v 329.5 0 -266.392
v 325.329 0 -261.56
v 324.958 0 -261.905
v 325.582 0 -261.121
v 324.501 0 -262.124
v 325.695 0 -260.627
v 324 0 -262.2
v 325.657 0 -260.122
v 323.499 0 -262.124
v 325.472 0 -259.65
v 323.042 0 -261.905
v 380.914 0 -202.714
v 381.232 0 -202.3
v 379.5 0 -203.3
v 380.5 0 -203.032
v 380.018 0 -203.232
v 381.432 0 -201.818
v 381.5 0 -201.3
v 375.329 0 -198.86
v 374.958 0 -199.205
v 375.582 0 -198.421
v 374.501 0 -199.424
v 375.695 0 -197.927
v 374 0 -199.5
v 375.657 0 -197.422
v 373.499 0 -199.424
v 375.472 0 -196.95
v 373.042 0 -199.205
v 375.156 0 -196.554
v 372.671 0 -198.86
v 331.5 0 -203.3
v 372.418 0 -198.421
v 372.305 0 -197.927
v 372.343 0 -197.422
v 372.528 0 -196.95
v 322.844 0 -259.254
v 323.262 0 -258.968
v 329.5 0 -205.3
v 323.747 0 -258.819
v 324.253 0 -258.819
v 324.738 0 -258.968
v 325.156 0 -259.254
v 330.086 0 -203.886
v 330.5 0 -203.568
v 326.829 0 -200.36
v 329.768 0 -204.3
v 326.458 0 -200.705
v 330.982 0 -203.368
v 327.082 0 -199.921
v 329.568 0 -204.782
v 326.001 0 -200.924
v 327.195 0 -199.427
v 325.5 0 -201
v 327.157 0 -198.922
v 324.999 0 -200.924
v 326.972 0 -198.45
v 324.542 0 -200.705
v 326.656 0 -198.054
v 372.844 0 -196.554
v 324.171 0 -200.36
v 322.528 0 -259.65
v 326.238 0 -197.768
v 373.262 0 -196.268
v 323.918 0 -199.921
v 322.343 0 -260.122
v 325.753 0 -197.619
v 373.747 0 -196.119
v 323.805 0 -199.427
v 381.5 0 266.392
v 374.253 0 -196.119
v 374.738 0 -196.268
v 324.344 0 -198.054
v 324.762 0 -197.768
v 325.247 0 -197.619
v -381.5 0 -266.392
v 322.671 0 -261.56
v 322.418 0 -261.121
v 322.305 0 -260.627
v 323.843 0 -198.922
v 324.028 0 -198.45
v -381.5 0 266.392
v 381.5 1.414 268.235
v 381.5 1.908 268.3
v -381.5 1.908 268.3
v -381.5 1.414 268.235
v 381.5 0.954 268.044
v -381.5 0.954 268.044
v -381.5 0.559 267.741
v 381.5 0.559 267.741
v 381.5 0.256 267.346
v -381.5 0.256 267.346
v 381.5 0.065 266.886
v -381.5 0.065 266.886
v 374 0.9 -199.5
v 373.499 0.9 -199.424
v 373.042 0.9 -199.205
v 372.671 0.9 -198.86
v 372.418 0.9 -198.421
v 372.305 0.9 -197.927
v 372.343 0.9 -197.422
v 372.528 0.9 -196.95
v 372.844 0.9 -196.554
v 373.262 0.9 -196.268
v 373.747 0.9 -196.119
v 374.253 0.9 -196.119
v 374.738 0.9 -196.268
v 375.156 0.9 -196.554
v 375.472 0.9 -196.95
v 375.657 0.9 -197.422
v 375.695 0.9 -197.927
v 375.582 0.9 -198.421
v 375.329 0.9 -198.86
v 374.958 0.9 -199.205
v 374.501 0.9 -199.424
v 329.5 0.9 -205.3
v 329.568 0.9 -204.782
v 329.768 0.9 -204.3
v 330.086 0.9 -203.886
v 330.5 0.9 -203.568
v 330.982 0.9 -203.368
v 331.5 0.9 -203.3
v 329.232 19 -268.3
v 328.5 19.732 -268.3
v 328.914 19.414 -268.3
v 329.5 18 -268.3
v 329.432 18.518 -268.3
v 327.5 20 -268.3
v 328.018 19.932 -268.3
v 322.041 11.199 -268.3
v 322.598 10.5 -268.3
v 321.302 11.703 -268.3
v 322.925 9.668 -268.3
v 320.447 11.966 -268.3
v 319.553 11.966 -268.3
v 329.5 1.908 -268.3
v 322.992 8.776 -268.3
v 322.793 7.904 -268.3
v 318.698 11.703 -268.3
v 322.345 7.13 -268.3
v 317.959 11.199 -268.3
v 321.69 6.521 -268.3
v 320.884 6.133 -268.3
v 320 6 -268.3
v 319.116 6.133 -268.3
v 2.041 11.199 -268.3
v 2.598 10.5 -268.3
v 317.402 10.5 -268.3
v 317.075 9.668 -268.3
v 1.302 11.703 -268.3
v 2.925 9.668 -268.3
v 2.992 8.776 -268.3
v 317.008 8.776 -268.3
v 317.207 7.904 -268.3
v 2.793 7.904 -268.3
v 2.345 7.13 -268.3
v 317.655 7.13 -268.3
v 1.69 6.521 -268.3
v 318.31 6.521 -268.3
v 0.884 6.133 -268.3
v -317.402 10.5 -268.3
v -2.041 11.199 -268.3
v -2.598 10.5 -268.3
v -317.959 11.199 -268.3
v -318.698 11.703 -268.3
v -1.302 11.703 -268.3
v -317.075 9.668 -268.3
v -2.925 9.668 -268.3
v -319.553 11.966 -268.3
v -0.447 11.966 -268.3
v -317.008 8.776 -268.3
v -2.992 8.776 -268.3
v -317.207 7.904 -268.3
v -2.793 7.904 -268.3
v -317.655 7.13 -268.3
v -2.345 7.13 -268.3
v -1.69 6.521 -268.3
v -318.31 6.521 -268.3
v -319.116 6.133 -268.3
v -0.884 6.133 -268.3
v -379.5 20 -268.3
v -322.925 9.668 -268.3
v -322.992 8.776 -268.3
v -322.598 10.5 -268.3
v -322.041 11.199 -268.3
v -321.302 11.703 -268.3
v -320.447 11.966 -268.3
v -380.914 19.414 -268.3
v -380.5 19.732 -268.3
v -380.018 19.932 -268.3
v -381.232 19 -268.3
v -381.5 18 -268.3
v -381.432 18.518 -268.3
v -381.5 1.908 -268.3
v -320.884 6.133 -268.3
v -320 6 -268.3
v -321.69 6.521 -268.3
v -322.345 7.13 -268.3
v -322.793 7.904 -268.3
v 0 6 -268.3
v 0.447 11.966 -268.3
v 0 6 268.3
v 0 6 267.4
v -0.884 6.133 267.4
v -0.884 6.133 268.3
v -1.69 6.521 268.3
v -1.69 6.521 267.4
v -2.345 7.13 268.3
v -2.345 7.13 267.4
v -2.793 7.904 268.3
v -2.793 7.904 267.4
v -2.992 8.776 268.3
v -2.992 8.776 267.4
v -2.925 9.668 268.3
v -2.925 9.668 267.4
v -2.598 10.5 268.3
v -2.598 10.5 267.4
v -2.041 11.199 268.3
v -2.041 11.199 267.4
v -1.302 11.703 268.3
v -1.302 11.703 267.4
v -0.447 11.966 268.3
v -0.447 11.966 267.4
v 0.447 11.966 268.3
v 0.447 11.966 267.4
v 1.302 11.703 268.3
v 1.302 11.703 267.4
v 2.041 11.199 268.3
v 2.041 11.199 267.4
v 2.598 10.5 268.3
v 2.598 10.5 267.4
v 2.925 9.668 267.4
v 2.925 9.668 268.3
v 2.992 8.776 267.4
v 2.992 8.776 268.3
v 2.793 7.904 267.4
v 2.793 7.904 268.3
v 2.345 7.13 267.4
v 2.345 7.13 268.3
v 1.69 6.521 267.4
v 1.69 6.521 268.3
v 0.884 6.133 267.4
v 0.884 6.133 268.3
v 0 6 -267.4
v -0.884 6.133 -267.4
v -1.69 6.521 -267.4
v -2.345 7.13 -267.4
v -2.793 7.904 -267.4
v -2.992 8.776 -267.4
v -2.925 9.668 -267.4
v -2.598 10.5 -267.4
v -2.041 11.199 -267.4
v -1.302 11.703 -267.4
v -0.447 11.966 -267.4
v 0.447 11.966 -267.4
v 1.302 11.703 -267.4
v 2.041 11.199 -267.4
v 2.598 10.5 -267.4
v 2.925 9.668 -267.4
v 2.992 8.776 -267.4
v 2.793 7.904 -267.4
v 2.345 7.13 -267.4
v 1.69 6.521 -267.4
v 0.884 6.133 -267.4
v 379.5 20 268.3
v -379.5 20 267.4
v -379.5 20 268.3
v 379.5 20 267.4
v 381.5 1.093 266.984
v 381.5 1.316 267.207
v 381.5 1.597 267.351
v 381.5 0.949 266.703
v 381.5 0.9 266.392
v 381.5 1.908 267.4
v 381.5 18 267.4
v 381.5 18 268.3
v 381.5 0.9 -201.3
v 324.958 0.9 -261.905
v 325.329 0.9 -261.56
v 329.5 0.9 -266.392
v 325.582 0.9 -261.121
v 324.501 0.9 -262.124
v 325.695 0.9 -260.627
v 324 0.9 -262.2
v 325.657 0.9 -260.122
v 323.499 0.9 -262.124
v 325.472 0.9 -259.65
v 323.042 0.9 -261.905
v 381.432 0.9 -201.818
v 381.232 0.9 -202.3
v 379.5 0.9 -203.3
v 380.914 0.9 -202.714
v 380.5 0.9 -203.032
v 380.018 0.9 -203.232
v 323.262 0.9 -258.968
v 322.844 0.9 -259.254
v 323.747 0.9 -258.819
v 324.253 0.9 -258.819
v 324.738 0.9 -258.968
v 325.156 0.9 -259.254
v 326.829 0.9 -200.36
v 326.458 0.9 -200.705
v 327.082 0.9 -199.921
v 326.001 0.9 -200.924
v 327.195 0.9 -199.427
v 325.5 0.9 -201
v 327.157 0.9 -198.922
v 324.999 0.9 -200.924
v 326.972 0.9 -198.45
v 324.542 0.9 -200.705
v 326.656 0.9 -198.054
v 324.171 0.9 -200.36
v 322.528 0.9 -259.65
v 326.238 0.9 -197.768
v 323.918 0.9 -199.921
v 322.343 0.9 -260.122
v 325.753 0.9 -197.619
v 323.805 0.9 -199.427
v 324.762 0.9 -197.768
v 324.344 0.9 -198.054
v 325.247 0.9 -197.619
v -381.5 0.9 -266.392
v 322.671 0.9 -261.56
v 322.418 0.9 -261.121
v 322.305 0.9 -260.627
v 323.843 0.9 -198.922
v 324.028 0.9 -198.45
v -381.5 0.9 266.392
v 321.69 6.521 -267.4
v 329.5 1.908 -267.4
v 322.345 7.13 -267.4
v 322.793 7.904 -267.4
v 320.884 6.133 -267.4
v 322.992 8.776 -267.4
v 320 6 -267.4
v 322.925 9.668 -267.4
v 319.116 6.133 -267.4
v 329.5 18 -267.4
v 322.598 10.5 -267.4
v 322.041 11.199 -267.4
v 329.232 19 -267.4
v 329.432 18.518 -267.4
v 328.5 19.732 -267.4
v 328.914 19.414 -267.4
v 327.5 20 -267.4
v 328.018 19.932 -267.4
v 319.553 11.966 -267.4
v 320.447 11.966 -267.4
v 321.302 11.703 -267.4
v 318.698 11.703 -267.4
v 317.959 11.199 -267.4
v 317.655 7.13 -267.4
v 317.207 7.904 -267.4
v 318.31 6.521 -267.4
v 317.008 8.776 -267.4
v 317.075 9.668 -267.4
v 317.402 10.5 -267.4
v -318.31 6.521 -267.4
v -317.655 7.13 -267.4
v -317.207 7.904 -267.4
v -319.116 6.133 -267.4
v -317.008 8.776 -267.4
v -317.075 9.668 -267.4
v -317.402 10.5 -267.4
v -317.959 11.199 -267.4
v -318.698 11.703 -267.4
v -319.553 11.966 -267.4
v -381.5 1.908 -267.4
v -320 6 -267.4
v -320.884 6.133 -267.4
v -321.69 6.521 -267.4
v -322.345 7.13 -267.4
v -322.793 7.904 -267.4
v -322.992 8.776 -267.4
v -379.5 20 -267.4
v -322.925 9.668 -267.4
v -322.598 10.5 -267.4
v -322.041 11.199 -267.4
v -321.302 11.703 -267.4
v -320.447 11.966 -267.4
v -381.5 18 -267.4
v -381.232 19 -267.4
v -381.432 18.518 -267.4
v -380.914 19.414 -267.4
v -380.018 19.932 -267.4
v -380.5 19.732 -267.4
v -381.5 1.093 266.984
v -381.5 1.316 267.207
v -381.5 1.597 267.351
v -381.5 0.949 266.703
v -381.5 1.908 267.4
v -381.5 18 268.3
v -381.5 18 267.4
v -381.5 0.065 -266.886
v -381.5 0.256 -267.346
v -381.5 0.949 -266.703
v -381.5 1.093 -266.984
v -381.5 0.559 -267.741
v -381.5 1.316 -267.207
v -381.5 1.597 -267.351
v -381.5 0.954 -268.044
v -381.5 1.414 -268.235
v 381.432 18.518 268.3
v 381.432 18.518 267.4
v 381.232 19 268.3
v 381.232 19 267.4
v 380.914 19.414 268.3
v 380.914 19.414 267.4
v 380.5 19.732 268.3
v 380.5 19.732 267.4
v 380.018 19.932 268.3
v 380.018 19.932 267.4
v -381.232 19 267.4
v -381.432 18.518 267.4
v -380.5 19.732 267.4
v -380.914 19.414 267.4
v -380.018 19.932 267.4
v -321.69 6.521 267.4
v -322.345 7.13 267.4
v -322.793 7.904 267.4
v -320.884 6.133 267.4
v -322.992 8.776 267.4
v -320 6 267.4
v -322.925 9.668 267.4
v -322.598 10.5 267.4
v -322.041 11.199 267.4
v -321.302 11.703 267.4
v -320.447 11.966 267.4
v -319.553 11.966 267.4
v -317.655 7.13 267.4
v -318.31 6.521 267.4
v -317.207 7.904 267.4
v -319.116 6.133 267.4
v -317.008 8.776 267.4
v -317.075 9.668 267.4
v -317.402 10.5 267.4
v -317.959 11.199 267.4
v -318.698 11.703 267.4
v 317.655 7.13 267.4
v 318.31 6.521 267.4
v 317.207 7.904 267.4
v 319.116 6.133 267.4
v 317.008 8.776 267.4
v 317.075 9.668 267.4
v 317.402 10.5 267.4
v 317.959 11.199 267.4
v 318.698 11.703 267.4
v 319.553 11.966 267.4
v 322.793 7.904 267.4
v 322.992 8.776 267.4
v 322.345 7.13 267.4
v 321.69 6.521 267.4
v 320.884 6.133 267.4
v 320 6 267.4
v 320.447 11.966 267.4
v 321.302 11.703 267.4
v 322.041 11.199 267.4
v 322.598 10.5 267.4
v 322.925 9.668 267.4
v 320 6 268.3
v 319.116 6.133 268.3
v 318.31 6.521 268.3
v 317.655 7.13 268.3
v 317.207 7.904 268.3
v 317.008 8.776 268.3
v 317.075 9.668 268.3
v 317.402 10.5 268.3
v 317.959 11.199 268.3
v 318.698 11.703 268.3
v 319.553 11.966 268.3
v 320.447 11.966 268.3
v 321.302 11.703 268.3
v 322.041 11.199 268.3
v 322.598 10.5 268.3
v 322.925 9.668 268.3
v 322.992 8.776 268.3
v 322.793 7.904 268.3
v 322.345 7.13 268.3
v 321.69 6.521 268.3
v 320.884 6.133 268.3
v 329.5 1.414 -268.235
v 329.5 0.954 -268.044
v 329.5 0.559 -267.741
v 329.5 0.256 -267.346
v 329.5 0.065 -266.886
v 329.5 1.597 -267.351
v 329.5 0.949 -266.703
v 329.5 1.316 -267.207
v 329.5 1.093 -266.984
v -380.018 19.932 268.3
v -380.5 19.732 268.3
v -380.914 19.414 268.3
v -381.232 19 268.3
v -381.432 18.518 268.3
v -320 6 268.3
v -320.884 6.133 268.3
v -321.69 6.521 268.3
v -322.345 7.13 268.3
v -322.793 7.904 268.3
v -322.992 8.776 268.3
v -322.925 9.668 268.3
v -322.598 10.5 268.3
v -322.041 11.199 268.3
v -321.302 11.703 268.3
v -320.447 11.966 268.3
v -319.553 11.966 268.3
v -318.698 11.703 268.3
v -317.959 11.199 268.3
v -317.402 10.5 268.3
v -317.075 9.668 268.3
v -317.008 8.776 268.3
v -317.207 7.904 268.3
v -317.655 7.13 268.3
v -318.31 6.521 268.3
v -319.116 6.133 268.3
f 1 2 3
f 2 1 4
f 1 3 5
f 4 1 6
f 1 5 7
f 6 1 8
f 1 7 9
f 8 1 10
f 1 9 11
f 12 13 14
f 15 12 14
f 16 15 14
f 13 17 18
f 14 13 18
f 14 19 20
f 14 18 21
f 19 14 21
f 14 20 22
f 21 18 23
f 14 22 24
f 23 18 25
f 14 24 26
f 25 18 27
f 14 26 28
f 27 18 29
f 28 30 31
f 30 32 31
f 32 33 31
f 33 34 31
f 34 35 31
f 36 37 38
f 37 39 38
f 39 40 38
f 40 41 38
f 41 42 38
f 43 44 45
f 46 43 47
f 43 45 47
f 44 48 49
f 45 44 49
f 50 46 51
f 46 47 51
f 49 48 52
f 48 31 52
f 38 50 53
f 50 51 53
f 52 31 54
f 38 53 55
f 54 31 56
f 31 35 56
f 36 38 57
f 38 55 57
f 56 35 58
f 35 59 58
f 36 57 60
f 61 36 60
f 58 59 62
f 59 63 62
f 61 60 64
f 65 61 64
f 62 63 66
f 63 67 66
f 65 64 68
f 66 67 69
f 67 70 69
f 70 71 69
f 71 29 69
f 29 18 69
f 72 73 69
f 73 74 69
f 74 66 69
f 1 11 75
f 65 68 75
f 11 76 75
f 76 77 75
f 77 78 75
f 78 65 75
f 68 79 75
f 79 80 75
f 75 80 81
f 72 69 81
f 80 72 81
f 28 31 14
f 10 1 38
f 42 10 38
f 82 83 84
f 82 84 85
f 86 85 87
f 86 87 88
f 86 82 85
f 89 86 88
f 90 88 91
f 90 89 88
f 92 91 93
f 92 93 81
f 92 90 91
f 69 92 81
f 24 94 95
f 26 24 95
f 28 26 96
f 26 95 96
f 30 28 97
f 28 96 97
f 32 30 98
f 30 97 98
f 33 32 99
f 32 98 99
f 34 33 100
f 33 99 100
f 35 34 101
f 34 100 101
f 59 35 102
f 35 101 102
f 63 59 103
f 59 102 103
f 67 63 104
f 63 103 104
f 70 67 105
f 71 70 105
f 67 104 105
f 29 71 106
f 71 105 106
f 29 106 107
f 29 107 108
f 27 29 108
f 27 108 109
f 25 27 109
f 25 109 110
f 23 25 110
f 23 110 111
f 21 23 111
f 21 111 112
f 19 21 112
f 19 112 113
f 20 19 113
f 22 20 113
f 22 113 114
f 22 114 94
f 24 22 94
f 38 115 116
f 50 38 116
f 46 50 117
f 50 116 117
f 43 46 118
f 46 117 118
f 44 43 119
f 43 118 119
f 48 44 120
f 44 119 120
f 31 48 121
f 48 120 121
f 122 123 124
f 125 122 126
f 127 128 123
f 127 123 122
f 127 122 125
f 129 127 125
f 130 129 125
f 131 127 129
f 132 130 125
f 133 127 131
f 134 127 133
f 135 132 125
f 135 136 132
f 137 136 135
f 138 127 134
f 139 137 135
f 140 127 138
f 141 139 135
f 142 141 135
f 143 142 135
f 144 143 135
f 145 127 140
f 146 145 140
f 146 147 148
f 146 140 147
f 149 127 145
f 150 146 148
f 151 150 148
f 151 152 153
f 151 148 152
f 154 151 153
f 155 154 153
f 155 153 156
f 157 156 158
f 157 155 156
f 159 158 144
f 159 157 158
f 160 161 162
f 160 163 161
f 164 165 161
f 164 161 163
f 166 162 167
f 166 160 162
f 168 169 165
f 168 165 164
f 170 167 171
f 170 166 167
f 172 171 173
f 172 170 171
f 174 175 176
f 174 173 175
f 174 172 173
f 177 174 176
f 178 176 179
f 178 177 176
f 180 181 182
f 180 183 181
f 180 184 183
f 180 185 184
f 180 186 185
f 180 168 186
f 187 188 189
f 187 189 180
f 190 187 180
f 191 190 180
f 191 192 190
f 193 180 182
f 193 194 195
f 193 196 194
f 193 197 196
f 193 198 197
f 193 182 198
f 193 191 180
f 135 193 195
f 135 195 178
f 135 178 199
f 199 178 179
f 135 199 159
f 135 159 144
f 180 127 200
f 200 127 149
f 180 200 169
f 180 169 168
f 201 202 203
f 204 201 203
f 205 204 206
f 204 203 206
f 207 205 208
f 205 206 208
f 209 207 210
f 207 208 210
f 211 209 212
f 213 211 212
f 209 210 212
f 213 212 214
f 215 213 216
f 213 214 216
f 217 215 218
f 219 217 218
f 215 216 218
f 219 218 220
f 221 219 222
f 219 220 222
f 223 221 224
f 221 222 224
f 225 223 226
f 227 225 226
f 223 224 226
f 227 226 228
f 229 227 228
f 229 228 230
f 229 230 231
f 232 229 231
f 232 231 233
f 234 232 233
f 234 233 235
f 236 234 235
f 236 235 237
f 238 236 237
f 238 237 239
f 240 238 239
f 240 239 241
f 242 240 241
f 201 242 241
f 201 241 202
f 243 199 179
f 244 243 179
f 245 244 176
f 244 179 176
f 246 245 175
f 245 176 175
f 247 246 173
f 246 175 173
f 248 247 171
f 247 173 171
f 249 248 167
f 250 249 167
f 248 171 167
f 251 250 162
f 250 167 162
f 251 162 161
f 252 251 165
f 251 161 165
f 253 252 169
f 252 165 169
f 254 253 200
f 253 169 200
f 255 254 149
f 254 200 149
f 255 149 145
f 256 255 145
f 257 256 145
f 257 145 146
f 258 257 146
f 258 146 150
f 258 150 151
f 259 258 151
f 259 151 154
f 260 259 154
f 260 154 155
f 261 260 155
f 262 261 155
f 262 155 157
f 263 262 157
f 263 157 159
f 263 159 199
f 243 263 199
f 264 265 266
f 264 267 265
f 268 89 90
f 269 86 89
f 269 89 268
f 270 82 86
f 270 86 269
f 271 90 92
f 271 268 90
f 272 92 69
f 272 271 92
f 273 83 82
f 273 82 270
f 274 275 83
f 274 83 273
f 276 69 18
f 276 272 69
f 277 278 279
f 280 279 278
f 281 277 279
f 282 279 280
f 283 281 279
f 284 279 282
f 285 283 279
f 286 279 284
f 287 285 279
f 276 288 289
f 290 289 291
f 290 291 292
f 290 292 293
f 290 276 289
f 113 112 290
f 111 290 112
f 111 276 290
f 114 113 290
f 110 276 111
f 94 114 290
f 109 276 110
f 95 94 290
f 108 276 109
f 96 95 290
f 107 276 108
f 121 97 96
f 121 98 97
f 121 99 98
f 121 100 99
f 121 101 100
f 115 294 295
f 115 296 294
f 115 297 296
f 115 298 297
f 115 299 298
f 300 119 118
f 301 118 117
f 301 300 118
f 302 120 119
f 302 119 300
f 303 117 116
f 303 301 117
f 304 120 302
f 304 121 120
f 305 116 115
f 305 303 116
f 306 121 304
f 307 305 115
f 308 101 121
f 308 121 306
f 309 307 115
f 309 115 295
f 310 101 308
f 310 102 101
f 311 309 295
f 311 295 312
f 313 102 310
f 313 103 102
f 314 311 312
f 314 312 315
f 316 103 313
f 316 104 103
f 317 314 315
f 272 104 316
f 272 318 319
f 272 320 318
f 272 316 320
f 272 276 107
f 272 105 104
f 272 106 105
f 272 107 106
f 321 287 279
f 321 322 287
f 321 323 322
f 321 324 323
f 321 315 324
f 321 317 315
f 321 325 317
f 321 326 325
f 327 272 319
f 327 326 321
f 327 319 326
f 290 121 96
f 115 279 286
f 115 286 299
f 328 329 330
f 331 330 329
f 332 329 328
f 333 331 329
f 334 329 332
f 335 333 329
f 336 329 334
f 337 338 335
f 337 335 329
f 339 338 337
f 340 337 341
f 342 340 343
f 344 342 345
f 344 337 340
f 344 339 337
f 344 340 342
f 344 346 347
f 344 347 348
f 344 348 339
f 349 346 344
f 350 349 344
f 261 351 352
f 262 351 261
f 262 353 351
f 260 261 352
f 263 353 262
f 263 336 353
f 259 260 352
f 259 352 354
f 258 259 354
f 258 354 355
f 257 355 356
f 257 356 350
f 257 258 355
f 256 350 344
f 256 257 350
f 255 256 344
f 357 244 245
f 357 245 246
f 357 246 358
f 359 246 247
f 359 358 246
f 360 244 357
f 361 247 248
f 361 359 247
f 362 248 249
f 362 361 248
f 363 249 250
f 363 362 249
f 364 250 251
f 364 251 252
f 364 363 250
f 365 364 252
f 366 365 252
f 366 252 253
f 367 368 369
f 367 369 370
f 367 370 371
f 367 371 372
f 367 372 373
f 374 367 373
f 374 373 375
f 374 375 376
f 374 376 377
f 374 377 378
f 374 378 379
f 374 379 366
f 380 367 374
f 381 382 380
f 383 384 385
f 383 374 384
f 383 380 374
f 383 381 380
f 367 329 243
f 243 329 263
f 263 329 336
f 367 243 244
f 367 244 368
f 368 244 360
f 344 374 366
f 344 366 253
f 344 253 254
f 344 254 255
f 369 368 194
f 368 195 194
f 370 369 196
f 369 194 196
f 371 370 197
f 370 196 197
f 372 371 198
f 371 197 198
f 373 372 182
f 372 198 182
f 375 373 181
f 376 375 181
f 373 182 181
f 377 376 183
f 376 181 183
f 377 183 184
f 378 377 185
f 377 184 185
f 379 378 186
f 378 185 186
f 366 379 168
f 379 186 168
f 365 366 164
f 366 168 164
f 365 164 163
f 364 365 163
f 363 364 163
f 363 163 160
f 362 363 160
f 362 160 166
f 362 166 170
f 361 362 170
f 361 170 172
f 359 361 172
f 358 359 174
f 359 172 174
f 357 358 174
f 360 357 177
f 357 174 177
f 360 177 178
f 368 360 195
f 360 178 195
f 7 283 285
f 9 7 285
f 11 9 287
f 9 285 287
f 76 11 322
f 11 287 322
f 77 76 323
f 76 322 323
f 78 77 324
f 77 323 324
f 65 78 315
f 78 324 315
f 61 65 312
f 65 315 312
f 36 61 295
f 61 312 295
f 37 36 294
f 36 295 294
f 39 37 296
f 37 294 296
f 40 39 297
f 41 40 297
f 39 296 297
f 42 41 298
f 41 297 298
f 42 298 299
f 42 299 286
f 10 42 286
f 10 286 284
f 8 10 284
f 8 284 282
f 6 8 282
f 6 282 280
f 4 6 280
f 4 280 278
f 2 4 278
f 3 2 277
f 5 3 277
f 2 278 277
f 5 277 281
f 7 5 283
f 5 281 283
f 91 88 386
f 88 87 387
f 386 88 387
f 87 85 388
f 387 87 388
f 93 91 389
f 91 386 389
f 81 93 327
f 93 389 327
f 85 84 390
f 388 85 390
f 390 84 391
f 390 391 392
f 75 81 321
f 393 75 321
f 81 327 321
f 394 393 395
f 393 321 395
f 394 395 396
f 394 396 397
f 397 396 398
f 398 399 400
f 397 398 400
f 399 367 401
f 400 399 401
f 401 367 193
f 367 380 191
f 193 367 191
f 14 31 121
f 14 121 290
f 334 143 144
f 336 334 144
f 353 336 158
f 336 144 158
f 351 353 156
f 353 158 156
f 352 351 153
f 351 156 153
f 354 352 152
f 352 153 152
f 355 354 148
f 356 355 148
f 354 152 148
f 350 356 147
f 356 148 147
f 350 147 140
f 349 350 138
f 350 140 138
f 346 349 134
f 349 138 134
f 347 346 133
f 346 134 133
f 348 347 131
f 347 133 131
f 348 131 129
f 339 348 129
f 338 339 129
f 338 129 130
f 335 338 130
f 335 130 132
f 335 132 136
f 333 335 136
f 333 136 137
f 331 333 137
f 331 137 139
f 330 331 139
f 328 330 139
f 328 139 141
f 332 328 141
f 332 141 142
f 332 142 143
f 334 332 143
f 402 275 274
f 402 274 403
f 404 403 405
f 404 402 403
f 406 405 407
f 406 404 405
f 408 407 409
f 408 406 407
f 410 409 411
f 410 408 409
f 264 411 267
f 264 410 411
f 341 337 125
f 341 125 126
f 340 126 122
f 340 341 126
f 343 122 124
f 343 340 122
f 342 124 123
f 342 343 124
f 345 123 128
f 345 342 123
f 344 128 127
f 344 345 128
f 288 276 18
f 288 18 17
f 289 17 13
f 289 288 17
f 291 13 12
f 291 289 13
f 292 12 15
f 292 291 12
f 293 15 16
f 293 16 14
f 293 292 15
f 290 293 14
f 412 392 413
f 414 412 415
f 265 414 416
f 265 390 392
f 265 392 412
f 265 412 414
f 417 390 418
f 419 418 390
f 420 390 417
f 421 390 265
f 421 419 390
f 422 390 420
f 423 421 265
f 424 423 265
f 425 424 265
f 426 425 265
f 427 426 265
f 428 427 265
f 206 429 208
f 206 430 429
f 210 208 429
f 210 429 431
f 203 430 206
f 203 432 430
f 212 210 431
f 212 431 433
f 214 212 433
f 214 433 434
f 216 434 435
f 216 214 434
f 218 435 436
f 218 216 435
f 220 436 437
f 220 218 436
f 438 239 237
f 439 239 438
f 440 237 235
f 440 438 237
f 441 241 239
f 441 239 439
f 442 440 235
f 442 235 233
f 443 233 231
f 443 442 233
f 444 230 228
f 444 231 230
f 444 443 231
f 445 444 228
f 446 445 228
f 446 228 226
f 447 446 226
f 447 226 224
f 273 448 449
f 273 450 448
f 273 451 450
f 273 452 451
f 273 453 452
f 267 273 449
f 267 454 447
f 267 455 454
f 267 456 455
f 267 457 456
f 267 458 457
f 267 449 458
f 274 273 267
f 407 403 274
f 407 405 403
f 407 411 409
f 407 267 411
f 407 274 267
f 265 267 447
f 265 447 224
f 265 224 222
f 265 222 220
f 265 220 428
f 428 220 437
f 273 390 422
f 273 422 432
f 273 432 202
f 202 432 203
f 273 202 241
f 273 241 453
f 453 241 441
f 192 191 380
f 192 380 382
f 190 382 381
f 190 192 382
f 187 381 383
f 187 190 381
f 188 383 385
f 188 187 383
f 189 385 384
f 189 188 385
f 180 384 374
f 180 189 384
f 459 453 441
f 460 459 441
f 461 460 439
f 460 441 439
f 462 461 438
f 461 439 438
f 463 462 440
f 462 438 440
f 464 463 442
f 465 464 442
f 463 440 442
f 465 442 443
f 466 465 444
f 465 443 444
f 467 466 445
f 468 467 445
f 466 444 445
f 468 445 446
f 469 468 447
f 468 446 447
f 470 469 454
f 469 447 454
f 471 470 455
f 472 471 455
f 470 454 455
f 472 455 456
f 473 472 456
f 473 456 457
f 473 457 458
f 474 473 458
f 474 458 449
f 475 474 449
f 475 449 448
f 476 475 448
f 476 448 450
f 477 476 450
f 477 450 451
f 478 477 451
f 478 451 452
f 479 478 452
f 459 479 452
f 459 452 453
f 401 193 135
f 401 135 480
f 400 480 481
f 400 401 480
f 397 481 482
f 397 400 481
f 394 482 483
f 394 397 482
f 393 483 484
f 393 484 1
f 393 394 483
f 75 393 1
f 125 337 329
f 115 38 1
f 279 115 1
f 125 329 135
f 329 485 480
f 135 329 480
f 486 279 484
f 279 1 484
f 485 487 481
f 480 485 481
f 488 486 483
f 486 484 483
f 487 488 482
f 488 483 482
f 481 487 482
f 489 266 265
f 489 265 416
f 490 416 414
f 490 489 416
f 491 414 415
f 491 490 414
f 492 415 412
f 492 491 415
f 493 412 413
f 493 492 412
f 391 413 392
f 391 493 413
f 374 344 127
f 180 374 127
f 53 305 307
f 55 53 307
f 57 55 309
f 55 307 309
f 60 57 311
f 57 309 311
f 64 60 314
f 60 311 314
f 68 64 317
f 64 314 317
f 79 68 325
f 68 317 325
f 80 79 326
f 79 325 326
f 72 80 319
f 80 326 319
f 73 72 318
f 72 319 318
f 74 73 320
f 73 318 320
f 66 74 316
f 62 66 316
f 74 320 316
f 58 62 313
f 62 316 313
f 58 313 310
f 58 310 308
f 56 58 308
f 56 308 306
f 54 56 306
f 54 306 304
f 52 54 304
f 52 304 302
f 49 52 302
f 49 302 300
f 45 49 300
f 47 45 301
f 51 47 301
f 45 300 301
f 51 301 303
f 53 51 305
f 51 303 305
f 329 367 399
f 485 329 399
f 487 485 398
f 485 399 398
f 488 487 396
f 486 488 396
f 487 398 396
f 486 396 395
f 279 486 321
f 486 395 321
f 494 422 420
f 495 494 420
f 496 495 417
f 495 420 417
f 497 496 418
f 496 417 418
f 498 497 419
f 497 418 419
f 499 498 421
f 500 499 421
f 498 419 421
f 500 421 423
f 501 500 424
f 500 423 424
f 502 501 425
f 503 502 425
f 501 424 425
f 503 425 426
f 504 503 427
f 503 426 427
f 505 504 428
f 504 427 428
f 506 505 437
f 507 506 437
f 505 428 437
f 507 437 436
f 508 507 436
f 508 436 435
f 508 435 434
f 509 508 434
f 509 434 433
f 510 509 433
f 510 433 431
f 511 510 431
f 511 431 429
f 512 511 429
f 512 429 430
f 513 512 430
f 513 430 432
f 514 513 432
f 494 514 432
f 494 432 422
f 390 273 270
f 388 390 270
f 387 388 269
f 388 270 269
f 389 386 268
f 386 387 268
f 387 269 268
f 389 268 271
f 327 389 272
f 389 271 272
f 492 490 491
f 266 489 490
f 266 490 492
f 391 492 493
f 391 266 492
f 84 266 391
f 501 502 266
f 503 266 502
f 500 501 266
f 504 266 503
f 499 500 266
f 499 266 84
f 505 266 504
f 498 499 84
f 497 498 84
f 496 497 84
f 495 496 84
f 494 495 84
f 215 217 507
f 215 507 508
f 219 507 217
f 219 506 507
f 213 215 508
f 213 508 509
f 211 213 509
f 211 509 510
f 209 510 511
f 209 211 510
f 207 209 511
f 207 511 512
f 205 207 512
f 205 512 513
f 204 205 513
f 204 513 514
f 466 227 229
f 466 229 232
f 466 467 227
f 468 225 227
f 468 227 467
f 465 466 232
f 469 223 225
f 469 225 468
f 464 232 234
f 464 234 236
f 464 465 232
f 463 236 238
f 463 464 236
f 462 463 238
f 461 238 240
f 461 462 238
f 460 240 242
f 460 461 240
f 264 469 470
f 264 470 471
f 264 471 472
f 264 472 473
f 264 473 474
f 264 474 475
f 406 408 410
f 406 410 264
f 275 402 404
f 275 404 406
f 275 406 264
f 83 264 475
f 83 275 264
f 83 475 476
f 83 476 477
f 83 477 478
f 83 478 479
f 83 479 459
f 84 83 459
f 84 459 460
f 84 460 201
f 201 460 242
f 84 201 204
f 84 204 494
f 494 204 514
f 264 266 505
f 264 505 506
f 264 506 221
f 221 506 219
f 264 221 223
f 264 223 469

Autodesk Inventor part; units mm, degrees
ref_plane "YZ Plane" through (0, 0, 0) normal (1, 0, 0) x (0, 1, 0)
ref_plane "XZ Plane" through (0, 0, 0) normal (0, 1, 0) x (-1, 0, 0)
ref_plane "XY Plane" through (0, 0, 0) normal (0, 0, 1) x (1, 0, 0)
sketch "Sketch1" plane through (0, 0, 0) normal (0, 1, 0) x (-1, 0, 0)
  line L0 (381.5, 268.3) -> (-381.5, 268.3)
  line L1 (-381.5, 268.3) -> (-381.5, -268.3)
  line L2 (-381.5, -268.3) -> (381.5, -268.3)
  line L3 (381.5, -268.3) -> (381.5, 268.3)
  line L4 (381.5, 268.3) -> (-381.5, -268.3) construction
  line L5 (-381.5, 268.3) -> (381.5, -268.3) construction
  point P0 (0, 0)
  dimension "d0" = 763
  dimension "d1" = 536.6
extrude "Plate1" add sketch "Sketch1" along normal blind 0.9
sketch "Sketch2" plane through (381.5, 0, 267.4) normal (0, 0, 1) x (1, 0, 0)
  line L0 (-763, 0) -> (0, 0)
  line L1 (0, 0) -> (0, 20)
  line L2 (0, 20) -> (-763, 20)
  line L3 (-763, 20) -> (-763, 0)
edge flange "Flange1" height 20 angle 90 thickness 0.9 bend radius 1.008 thickness toward (0, 0, 1) relief tear relief width 0.9 relief depth 0.45 corner gap 1.008 corner form 0 edges at (0, 0.9, 268.3) (0, 0.9, -268.3) wall of the first edge with corners at (-381.5, 0, 267.4) (381.5, 0, 267.4) (381.5, 20, 267.4) (-381.5, 20, 267.4)
bend "Bend1"
corner "Corner1"
sketch "Sketch3" plane through (-381.5, 20, 268.3) normal (0, 0, 1) x (1, 0, 0)
  circle A0 centre (381.5, -11) radius 1.7
  circle A1 centre (61.5, -11) radius 1.7
  line L0 (0, 0) -> (763, 0) projected
  point P0 (381.5, -20)
  point P1 (701.5, -11)
  dimension "d20" = 11
  dimension "d41" = 320
  dimension "d42" = 320
hole "Hole1" at (-320, 9, 268.3) at (0, 9, 268.3) at (320, 9, 268.3) direction (0, 0, -1) diameter 6 end through all
sketch "Sketch6" plane through (0, 0, 0) normal (0, -1, 0) x (1, 0, 0)
  line L0 (381.5, -268.3) -> (-381.5, -268.3) projected
  line L1 (329.5, -203.3) -> (329.5, -268.3)
  line L2 (329.5, -268.3) -> (381.5, -268.3)
  line L3 (381.5, -268.3) -> (381.5, -203.3)
  line L4 (329.5, -203.3) -> (381.5, -203.3)
  point P0 (0, 0)
  dimension "d39" = 52
  dimension "d44" = 65
extrude "Cut1" cut sketch "Sketch6" against normal through all
fillet "Corner Round1" radius 2 6 edges at (329.5, 20, -267.85) (381.5, 20, 267.85) (-381.5, 20, -267.85) (-381.5, 20, 267.85) (329.5, 0.45, -203.3) (381.5, 0.45, -203.3)
sketch "Sketch8" plane through (0, 0, 0) normal (0, -1, 0) x (1, 0, 0)
  circle A0 centre (325.5, -199.3) radius 1.8 projected
  circle A1 centre (374, -197.8) radius 1.8 projected
  circle A2 centre (324, -260.5) radius 1.8 projected
  arc A3 (377, -268) -> (381.5, -263.5) centre (377, -263.5) ccw projected
  line L0 (381.5, -263.5) -> (381.5, -193.3) projected
  arc A4 (381.5, -193.3) -> (378.5, -190.3) centre (378.5, -193.3) ccw projected
  line L1 (378.5, -190.3) -> (322.5, -190.3) projected
  arc A5 (322.5, -190.3) -> (316.5, -196.3) centre (322.5, -196.3) ccw projected
  line L2 (316.5, -196.3) -> (316.5, -265) projected
  arc A6 (316.5, -265) -> (319.5, -268) centre (319.5, -265) ccw projected
  line L3 (319.5, -268) -> (377, -268) projected
  line L4 (379.5, -208.3) -> (379.5, -263) projected
  arc A7 (376.5, -266) -> (379.5, -263) centre (376.5, -263) ccw projected
  line L5 (376.5, -266) -> (334.5, -266) projected
  arc A8 (331.5, -263) -> (334.5, -266) centre (334.5, -263) ccw projected
  line L6 (331.5, -263) -> (331.5, -208.3) projected
  arc A9 (334.5, -205.3) -> (331.5, -208.3) centre (334.5, -208.3) ccw projected
  line L7 (334.5, -205.3) -> (376.5, -205.3) projected
  arc A10 (379.5, -208.3) -> (376.5, -205.3) centre (376.5, -208.3) ccw projected
  point P0 (0, 0)
hole "Hole2" at (374, 0, -197.8) at (325.5, 0, -199.3) at (324, 0, -260.5) direction (0, 1, 0) diameter 3.4 depth 0.9 tip angle 118 clearance for "Countersunk Flat Head Screw ISO 2009/7046" size "M3" standard "ISO"
equation "\"d18\" = Thickness"
equation "\"d50\" = Thickness"
equation "\"d2\" = Thickness"
equation "\"d3\" = BendReliefWidth"
equation "\"d4\" = BendReliefDepth"
equation "\"d5\" = MinimumRemnant"
equation "\"d6\" = TransitionRadius"
equation "\"d9\" = BendRadius"
equation "\"d10\" = CornerReliefSize"
equation "\"d11\" = GapSize"
equation "\"d12\" = JacobiRadiusSize"
equation "\"BendReliefWidth\" = Thickness"
equation "\"BendReliefDepth\" = 0.5 * Thickness"
equation "\"CornerReliefSize\" = 4 * Thickness"
equation "\"MinimumRemnant\" = 2 * Thickness"
equation "\"TransitionRadius\" = BendRadius"
equation "\"JacobiRadiusSize\" = BendRadius"
equation "\"GapSize\" = Thickness"
equation "\"Thickness\" = 0.9"
equation "\"BendRadius\" = 1.008"
properties part number "SP41V1 Cubre Base" material "Steel, Carbon"
